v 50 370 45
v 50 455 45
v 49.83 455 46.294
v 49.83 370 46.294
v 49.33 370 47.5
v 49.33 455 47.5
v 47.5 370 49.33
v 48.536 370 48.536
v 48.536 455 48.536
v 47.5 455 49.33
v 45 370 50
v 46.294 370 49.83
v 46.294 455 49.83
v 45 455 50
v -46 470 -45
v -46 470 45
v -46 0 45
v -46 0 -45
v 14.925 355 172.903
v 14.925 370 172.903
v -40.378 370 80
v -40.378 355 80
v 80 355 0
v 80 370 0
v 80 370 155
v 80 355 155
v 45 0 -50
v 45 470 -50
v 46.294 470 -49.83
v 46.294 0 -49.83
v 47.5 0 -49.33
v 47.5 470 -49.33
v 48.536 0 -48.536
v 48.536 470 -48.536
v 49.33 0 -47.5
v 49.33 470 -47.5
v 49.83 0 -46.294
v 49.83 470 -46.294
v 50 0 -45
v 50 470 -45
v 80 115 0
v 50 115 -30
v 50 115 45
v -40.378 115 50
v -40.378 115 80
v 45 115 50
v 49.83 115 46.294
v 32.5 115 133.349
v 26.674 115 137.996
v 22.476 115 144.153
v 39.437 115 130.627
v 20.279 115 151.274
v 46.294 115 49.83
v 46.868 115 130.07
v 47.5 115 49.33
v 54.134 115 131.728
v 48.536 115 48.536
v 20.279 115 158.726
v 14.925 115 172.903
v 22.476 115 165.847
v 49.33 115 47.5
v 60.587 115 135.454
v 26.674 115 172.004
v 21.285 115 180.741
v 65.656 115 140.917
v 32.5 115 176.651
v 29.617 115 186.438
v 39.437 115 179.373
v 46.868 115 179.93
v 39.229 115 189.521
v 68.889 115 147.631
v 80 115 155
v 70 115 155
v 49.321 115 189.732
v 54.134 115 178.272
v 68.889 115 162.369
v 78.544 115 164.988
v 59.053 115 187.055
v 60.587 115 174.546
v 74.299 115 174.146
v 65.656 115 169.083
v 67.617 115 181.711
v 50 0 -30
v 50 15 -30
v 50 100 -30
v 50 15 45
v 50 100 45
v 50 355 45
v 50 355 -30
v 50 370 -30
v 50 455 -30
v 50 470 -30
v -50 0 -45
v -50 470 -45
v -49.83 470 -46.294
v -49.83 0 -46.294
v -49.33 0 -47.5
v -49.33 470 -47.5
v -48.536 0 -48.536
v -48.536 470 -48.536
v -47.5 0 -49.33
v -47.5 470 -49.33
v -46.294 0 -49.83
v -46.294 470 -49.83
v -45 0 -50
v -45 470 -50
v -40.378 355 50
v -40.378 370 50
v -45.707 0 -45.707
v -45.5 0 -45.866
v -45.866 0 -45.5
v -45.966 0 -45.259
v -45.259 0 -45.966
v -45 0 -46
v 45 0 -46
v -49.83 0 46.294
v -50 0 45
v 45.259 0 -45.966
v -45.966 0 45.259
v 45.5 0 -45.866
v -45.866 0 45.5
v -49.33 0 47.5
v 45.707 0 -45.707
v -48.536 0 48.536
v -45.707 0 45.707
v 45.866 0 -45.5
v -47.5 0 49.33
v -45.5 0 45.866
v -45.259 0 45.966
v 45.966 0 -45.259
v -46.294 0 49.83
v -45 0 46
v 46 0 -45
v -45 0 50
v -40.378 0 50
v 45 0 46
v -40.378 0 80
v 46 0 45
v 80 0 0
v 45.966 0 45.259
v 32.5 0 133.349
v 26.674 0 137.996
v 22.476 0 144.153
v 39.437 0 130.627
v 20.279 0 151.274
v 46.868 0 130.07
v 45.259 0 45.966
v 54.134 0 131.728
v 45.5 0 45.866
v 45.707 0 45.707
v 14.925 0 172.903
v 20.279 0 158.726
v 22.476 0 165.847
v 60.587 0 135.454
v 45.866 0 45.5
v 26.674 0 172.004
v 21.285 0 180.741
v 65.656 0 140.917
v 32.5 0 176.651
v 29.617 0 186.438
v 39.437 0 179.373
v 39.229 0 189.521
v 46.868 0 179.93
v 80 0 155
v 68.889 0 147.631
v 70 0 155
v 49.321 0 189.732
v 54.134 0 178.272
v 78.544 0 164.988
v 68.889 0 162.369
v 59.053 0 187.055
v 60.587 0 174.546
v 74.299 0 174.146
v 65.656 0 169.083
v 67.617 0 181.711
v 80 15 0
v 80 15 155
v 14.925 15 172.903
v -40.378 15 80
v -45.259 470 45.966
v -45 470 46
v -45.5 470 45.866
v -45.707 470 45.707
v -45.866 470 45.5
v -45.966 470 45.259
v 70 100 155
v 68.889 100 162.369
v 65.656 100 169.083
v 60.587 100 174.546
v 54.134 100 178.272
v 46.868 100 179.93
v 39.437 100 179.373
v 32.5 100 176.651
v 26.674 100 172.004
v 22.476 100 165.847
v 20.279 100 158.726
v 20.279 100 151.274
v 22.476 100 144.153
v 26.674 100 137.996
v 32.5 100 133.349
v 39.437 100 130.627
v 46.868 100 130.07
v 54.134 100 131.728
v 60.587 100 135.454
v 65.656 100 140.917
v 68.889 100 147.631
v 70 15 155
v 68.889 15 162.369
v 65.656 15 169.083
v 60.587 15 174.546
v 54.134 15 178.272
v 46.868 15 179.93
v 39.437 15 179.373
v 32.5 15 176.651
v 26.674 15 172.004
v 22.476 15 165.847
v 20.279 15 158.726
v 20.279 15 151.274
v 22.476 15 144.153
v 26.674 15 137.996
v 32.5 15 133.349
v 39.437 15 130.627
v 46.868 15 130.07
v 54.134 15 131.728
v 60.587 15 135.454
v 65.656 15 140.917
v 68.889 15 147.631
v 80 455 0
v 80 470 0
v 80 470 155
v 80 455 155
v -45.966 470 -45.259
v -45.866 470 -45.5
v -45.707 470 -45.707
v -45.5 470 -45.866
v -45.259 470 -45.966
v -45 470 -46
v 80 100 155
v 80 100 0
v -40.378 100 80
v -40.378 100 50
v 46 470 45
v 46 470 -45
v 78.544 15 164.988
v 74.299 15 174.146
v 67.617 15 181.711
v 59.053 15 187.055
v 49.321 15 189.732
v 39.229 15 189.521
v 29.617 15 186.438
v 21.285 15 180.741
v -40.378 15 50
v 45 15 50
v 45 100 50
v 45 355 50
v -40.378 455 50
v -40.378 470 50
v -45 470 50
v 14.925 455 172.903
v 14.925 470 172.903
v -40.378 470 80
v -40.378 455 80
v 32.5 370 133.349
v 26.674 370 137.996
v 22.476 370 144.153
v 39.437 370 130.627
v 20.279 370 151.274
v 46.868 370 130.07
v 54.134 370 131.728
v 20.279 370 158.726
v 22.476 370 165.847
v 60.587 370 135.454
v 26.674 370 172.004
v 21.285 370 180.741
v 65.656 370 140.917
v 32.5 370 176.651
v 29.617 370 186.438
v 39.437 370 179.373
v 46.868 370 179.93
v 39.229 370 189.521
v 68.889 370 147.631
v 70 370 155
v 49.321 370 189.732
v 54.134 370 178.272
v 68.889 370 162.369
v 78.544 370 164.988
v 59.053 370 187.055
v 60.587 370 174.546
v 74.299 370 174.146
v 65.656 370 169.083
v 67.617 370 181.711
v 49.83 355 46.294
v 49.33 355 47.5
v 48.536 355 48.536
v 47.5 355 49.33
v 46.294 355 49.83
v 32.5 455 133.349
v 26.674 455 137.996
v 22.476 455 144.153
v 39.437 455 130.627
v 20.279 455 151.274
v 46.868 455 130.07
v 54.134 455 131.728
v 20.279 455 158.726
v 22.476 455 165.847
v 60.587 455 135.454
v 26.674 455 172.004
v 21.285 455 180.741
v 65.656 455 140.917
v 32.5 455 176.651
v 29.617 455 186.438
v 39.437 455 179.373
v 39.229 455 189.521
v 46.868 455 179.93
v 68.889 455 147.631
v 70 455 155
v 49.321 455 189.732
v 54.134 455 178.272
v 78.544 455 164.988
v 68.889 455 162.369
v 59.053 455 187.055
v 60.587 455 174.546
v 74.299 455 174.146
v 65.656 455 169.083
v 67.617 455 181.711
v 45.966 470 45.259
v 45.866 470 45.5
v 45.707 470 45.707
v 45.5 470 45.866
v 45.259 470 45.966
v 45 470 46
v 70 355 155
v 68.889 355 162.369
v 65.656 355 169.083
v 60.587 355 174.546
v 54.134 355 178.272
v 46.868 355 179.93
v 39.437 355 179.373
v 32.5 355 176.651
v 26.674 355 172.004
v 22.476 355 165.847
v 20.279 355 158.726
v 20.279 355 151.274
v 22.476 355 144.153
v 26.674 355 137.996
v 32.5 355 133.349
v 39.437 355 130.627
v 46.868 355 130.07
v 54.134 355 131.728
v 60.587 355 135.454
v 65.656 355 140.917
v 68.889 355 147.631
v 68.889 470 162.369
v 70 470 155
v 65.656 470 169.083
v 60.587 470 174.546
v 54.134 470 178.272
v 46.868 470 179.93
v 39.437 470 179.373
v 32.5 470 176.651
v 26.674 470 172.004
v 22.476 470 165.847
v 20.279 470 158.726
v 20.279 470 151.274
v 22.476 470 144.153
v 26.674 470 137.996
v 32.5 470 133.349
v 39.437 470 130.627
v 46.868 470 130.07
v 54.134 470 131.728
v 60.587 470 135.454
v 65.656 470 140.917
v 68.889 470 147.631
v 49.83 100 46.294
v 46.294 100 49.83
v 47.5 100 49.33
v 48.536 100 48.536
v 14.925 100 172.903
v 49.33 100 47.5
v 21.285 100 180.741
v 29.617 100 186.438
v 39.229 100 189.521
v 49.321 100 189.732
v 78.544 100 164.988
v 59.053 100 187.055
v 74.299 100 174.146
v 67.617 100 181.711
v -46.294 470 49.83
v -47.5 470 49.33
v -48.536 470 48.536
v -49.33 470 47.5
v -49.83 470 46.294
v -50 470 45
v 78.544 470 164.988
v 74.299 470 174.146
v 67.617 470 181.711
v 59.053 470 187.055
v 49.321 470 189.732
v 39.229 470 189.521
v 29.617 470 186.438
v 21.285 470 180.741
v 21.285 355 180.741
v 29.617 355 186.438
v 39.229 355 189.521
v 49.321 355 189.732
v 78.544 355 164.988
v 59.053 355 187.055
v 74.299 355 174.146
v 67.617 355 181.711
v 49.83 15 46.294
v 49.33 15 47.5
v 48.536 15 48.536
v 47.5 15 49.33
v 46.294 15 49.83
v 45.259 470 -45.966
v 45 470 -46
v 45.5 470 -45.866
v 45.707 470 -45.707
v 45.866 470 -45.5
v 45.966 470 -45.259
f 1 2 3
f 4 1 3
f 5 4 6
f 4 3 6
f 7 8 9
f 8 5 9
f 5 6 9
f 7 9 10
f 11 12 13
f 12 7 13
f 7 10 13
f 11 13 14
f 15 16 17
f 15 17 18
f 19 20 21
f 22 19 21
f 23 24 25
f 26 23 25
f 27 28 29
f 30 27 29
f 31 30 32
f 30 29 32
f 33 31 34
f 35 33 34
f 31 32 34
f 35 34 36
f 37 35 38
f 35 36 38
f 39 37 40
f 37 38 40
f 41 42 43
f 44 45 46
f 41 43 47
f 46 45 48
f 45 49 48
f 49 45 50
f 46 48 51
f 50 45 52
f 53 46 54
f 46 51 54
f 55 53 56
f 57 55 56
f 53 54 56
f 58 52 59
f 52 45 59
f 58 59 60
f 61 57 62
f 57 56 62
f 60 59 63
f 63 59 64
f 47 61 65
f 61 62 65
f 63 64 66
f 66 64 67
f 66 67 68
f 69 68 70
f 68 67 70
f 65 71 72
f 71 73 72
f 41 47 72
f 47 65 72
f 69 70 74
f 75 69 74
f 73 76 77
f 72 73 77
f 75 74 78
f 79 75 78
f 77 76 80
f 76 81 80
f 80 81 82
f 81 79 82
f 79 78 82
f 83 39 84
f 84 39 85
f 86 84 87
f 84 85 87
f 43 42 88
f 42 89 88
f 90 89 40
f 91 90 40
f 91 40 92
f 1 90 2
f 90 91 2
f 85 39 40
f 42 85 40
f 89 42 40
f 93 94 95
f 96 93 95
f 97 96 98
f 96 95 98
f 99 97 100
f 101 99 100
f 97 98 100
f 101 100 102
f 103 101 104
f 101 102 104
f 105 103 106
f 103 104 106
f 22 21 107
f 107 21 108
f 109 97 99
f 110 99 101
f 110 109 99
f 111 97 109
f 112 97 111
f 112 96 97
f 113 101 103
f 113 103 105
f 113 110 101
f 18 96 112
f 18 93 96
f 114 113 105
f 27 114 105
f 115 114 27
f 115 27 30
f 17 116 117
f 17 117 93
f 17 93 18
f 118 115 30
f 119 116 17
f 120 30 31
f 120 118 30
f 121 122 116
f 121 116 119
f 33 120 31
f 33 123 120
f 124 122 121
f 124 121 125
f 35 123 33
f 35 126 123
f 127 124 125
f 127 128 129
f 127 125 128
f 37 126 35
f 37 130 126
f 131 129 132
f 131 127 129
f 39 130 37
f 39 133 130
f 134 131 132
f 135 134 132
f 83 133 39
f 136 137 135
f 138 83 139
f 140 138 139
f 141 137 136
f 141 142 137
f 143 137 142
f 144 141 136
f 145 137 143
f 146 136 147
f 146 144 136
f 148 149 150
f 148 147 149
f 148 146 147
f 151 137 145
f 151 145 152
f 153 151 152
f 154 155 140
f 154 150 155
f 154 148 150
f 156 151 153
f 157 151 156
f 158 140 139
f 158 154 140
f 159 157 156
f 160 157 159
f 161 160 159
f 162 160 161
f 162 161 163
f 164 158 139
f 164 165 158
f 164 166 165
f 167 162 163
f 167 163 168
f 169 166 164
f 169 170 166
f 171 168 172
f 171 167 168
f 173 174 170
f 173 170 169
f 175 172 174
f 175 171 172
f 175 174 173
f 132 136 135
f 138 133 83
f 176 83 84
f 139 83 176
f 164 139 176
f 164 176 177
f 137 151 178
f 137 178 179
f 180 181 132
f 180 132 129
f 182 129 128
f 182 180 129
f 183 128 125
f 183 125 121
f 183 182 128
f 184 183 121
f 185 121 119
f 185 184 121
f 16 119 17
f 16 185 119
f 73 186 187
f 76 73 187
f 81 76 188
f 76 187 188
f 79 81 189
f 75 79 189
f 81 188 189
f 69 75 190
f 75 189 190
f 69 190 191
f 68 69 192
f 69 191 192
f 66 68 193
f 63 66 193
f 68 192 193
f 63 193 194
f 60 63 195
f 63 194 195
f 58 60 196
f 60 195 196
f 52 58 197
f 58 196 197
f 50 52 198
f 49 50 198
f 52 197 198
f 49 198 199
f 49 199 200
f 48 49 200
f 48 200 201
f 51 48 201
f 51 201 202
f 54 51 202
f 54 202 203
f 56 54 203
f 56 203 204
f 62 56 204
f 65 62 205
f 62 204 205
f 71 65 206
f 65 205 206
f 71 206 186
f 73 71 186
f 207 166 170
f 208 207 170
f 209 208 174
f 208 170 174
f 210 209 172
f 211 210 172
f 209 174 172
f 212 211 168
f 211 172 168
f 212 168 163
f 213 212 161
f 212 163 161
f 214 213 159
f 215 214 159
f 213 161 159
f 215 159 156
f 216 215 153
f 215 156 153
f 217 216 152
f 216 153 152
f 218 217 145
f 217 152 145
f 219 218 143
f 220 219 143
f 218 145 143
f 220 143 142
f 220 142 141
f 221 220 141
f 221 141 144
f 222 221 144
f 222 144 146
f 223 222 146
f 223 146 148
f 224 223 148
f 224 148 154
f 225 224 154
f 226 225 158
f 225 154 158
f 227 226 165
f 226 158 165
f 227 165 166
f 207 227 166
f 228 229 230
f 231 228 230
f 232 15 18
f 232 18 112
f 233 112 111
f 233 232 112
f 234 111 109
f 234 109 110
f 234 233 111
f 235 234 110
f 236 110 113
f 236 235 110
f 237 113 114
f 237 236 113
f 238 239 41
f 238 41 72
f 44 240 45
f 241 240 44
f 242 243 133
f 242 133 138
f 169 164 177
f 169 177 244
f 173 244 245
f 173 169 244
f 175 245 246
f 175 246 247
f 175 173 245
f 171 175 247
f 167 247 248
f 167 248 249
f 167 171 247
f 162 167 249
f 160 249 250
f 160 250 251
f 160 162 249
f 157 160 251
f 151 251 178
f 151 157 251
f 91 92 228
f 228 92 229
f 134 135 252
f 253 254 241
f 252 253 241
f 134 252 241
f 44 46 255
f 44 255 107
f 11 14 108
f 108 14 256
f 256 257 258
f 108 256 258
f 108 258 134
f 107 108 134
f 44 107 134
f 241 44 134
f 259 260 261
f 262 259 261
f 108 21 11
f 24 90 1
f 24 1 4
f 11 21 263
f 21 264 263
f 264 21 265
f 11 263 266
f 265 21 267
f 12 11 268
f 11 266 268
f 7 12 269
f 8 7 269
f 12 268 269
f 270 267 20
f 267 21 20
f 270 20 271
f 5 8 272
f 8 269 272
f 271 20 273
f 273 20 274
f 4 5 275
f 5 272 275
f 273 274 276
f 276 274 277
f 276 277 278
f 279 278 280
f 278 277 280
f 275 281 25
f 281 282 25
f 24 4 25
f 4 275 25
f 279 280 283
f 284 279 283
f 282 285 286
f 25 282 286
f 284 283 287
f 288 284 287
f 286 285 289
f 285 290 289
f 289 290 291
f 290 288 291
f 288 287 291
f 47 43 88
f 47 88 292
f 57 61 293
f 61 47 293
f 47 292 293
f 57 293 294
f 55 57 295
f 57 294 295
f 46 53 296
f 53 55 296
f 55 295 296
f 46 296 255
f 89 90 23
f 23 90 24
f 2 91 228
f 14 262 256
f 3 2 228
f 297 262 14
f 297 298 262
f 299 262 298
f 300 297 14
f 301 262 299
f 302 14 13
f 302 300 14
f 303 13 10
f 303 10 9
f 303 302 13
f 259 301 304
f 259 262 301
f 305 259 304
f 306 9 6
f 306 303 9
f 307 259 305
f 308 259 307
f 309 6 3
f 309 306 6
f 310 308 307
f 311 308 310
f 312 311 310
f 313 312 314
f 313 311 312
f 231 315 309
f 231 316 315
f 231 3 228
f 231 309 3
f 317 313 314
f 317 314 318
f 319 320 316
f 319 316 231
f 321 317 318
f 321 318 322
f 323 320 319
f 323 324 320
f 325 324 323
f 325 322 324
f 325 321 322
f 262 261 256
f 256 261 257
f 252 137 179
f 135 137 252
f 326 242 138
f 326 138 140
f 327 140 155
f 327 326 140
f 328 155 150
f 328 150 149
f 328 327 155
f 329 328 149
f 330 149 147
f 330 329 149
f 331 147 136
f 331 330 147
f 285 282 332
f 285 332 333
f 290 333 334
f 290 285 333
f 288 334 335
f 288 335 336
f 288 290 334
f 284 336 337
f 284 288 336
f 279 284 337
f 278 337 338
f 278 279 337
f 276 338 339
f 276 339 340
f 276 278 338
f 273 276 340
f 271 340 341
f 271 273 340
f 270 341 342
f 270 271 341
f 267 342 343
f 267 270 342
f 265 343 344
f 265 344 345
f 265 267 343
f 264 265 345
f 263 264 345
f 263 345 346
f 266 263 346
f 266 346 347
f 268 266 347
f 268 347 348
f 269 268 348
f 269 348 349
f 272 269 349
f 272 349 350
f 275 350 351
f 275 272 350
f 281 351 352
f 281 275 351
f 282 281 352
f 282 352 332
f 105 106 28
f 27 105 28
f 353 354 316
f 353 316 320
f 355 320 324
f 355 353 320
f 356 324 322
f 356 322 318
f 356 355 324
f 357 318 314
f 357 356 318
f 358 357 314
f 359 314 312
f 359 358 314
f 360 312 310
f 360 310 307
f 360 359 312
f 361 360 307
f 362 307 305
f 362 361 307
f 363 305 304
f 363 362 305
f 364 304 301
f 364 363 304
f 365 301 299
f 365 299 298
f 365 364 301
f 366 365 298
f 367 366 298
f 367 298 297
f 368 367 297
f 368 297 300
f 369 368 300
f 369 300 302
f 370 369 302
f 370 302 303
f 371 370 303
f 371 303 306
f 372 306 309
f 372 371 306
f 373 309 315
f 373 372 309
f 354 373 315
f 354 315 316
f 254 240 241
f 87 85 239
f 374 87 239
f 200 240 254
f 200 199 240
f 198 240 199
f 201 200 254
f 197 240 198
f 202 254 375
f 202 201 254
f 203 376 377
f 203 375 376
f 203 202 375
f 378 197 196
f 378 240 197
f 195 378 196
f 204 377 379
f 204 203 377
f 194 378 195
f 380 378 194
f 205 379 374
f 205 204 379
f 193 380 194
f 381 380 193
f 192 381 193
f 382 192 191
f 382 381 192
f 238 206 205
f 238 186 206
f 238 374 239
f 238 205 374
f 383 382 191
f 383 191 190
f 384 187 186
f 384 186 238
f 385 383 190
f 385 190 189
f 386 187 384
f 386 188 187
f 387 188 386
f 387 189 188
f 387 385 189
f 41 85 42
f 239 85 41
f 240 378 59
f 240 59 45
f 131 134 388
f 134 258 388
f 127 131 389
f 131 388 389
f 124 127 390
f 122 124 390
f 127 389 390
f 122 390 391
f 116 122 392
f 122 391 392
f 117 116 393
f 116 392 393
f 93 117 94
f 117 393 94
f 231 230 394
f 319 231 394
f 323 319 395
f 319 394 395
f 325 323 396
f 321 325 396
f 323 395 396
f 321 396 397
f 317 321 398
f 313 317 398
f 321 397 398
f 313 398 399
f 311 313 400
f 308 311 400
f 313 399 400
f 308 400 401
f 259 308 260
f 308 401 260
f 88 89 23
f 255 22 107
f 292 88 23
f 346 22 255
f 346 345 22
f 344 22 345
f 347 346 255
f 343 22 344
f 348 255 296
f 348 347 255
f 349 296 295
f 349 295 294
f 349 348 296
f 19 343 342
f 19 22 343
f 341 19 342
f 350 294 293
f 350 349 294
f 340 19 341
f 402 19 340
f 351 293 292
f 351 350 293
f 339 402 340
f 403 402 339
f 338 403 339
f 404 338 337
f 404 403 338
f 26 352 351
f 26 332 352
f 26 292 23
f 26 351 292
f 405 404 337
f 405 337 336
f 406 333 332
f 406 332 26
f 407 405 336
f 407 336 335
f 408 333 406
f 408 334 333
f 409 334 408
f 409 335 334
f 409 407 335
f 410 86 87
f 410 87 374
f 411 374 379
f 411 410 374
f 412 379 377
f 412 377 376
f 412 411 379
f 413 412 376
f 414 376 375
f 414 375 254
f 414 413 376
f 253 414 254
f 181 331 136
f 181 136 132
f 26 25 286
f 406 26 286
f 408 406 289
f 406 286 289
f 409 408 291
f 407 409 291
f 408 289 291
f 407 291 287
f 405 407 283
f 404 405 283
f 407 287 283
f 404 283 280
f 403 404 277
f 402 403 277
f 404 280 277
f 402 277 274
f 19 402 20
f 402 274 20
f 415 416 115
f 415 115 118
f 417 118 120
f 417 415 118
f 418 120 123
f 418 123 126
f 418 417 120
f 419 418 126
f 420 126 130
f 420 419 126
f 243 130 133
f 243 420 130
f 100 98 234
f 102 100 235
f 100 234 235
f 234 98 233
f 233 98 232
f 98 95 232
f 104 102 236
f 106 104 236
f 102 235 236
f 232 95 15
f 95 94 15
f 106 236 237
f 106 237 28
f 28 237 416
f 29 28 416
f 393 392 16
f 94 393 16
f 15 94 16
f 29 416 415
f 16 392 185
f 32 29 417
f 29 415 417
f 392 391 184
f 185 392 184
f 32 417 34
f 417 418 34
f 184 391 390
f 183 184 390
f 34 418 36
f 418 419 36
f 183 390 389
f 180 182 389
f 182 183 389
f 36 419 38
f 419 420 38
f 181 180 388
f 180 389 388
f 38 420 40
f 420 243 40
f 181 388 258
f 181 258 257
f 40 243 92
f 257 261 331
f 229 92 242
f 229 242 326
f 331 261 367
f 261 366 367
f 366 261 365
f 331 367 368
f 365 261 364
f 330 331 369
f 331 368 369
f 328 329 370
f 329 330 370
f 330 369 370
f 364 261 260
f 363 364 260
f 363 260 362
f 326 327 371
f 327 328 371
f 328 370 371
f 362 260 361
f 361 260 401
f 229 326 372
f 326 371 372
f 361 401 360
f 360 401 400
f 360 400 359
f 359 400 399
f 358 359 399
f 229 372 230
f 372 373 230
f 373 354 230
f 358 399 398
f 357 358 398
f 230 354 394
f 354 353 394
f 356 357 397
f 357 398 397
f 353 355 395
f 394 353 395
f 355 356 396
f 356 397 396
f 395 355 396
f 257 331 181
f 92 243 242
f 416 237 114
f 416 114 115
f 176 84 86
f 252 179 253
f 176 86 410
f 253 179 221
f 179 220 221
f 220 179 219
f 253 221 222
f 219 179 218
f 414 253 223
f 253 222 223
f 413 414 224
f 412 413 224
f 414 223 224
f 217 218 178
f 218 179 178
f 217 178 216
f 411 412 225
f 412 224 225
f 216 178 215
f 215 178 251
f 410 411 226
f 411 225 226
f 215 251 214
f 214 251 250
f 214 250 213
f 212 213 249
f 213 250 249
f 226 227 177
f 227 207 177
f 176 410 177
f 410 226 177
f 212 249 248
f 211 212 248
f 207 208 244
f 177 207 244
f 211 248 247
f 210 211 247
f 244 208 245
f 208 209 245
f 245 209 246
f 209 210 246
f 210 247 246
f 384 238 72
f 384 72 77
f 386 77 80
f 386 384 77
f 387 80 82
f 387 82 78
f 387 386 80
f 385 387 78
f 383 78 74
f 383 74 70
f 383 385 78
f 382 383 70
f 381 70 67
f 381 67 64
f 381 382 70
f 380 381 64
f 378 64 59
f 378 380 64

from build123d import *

# Parameters (mm, degrees)
F1_DEPTH = 235
F2_T     = -4
F0_R     = 25
F3_DEPTH = 15


with BuildPart() as f1:
    # F0 (on Front) → F1 (new body)
    with BuildSketch(Plane.XZ):
        with BuildLine():
            ThreePointArc((50, 45), (48.5355339059, 48.5355339059), (45, 50))
            Line((45, 50), (-40.3777472675, 50))
            Line((-40.3777472675, 50), (-45, 50))
            ThreePointArc((-45, 50), (-48.5355339059, 48.5355339059), (-50, 45))
            Line((-50, 45), (-50, -45))
            ThreePointArc((-50, -45), (-48.5355339059, -48.5355339059), (-45, -50))
            Line((-45, -50), (45, -50))
            ThreePointArc((45, -50), (48.5355339059, -48.5355339059), (50, -45))
            Line((50, -45), (50, -30))
            Line((50, -30), (50, 45))
        make_face()
    extrude(amount=-F1_DEPTH)

    # F2
    f2_openings = [f1.faces().sort_by_distance(p)[0] for p in [
        (0, 0, 0),
        (0, 235, 0),
    ]]
    offset(amount=F2_T, openings=f2_openings)

    # F0 (on Front) → F3 (join)
    with BuildSketch(Plane.XZ):
        with BuildLine():
            Line((-40.3777472675, 50), (45, 50))
            ThreePointArc((45, 50), (48.5355339059, 48.5355339059), (50, 45))
            Line((50, 45), (50, -30))
            Line((50, -30), (80, 0))
            Line((80, 0), (80, 155))
            ThreePointArc((80, 155), (54.2839853809, 188.7462237213), (14.9252791173, 172.9028255822))
            Line((14.9252791173, 172.9028255822), (-40.3777472675, 80))
            Line((-40.3777472675, 80), (-40.3777472675, 50))
        make_face()
        with Locations((45, 155)):
            Circle(F0_R, mode=Mode.SUBTRACT)
    extrude(amount=-F3_DEPTH)


with BuildPart() as f4_1:
    # F4: copy of F1
    add(f1.part.moved(Location((0, 100, 0))))


with BuildPart() as f1_1:
    add(f1.part)

    add(f4_1.part)  # F5 merges F4_1
    # F5: F1, F4_1 across face
    add(f1.part.mirror(Plane(origin=(0, 235, 0), x_dir=(1, 0, 0), z_dir=(0, 1, 0))))
    add(f4_1.part.mirror(Plane(origin=(0, 235, 0), x_dir=(1, 0, 0), z_dir=(0, 1, 0))))


solid = f1_1.part
